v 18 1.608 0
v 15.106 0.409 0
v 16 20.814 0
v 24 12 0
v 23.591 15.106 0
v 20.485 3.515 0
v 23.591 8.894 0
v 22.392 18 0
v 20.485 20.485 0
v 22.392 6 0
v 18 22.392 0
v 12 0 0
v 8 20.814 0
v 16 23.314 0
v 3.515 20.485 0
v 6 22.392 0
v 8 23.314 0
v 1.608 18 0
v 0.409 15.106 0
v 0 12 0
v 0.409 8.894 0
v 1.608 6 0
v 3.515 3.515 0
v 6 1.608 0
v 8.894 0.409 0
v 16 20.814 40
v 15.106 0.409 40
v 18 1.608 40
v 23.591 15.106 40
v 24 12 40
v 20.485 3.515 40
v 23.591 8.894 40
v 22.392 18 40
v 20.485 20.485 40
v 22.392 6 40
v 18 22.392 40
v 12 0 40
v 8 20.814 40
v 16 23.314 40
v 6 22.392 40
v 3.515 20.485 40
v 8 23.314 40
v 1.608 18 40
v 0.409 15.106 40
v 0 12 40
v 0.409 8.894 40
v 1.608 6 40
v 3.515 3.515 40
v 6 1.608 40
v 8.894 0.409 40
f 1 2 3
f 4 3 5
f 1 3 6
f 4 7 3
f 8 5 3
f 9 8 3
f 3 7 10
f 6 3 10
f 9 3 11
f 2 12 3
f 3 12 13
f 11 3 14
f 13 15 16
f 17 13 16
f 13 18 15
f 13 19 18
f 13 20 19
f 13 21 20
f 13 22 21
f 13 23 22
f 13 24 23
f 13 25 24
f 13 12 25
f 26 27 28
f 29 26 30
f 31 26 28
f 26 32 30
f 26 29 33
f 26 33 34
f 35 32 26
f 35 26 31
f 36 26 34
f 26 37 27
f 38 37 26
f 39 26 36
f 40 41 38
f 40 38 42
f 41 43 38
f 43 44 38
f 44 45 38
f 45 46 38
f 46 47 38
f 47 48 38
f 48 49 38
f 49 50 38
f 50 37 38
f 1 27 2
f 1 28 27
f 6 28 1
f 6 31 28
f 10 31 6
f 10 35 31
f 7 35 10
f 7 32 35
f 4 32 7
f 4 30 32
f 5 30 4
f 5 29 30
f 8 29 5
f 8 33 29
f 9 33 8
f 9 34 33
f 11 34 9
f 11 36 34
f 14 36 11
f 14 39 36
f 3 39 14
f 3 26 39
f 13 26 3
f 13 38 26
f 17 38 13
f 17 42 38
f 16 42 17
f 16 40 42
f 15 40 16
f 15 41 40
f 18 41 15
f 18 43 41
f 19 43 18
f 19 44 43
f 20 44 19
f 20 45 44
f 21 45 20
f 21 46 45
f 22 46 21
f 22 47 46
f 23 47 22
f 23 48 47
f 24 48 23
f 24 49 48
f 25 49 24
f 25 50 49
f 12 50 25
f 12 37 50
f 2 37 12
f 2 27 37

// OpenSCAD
$fn = 32;

// ----------------------------------------------------------------------
// Keyway shaft: d24 shaft, key 8 x 2.5 mm
// ----------------------------------------------------------------------

// --- parameters (mm) ---
shaft_r = 12;             // shaft radius
key_w = 8;                // keyway width
key_d = 2.5;              // keyway depth below the surface line
plate_t = 40;             // shaft length, Z (extrusion height)

shaft_d = 2 * shaft_r;  // shaft diameter
circle_step = 15;  // polygon sampling step, degrees

profile = [[6, 22.392], [3.515, 20.485], [1.608, 18], [0.409, 15.106], [0, 12], [0.409, 8.894], [1.608, 6], [3.515, 3.515], [6, 1.608], [8.894, 0.409], [12, 0], [15.106, 0.409], [18, 1.608], [20.485, 3.515], [22.392, 6], [23.591, 8.894], [24, 12], [23.591, 15.106], [22.392, 18], [20.485, 20.485], [18, 22.392], [16, 23.314], [16, 20.814], [8, 20.814], [8, 23.314]];  // primary outline, 25 points, counter clockwise

// --- the one profile operation ---
linear_extrude(height = plate_t) polygon(points = profile);
